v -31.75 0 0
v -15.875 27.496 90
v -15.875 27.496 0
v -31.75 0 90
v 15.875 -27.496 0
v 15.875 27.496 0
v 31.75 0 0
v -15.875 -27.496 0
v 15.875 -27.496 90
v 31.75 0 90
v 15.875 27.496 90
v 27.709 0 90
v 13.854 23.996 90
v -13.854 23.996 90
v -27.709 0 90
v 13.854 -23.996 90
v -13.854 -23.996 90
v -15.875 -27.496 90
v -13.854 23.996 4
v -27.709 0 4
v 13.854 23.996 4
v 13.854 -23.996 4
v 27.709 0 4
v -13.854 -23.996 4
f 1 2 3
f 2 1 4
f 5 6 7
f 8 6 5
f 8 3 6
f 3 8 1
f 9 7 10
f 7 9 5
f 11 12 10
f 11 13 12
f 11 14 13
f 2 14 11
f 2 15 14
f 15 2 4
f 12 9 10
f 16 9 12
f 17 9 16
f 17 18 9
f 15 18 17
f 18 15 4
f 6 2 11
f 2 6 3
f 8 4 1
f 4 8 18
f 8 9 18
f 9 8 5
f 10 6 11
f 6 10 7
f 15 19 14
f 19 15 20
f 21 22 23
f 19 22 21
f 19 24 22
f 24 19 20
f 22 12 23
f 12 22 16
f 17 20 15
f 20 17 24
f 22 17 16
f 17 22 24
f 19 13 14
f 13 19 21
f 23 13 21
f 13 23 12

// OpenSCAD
// Hex Desk Organizer — Appy's Studio parametric generator
//
// A modular desk set: hexagonal cells that tessellate against each other, so a
// pen pot, a phone stand and a coaster sit together without gaps. The studio's
// own design — the existing modules are fixed at 31.75mm circumradius and
// 3.5mm walls, which is what `cell` and `wall` default to here, so a printed
// part still packs against the ones already on the desk.
//
// Magnet pockets go in the flats, not the base, so neighbouring cells hold on
// to each other rather than to the desk.

type = "pen";          // pen | marker | notes | cable | phone | coaster
cell = 31.75;          // circumradius — the studio standard
height = 90;
wall = 3.5;
base = 4.0;
magnets = false;
magnet_d = 6.2;        // 6mm magnet plus a printed-fit allowance
magnet_h = 3.2;

$fn = 64;

// A hexagon is specified by its circumradius; the flats sit at cr*cos(30).
apothem = cell * cos(30);
inner_apothem = apothem - wall;
inner_cell = inner_apothem / cos(30);

module hex(cr, h) {
    linear_extrude(height = h) circle(r = cr, $fn = 6);
}

// Straight-walled cup — the base for most of the modules.
module cup(h, floor_thickness) {
    difference() {
        hex(cell, h);
        translate([0, 0, floor_thickness])
            hex(inner_cell, h);
    }
}

// Pockets in each of the six flats, at mid-height, so cells snap side to side.
module magnet_pockets(h) {
    z = min(h / 2, max(magnet_d, 12));
    for (i = [0 : 5])
        rotate([0, 0, i * 60])
            translate([apothem - magnet_h, 0, z])
                rotate([0, 90, 0])
                    cylinder(d = magnet_d, h = magnet_h + 0.01, $fn = 32);
}

// Everything above the plane that meets the front flat at `front_z` and the
// back flat at `back_z`. Cutting downward-only matters: a cut that also leaned
// forward would slice the footprint back from a full hexagon, and then the cell
// no longer sits flush against its neighbours, which is the whole point of the
// system.
module slanted_top(front_z, back_z) {
    angle = atan2(back_z - front_z, 2 * apothem);
    big = cell * 6;
    translate([0, 0, (front_z + back_z) / 2])
        rotate([0, -angle, 0])
            translate([0, 0, big / 2])
                cube([big, big, big], center = true);
}

module body() {
    if (type == "pen") {
        cup(height, base);

    } else if (type == "marker") {
        // Markers are stubby, so this one is shorter and cut away at the front:
        // a low lip to hold them in, a high back so it still reads as a cell.
        h = max(30, height * 0.62);
        difference() {
            cup(h, base);
            slanted_top(h * 0.45, h);
        }

    } else if (type == "notes") {
        // A shallow well for a note block, open at the front so the top sheet
        // can be pulled off without lifting the pad out.
        h = max(20, height * 0.35);
        difference() {
            cup(h, base);
            slanted_top(base + 4, h);
        }

    } else if (type == "cable") {
        // Solid-ish block with slots across the top to drop cable ends into.
        h = max(18, height * 0.28);
        slot = 5;
        difference() {
            hex(cell, h);
            for (i = [-1, 0, 1])
                translate([i * (slot * 2.2), 0, h - slot * 0.8])
                    rotate([0, 0, 90])
                        union() {
                            // A keyhole: narrow at the top so the cable clips
                            // in and the plug end cannot pull back through.
                            translate([0, 0, slot * 0.8])
                                cube([cell * 3, slot * 0.62, slot * 1.6], center = true);
                            rotate([0, 90, 0])
                                cylinder(d = slot, h = cell * 3, center = true, $fn = 32);
                        }
        }

    } else if (type == "phone") {
        // A solid block with a leaning slot down the middle. 15 degrees off
        // vertical is where a phone stops trying to tip forward out of it.
        lean = 15;
        slot_w = 13;            // phone plus a case
        h = max(40, height * 0.62);
        slot_depth = h * 0.6;
        difference() {
            hex(cell, h);
            // The slot's floor sits at the rotation origin and it runs well
            // past the top, so the cut is open rather than a buried pocket.
            translate([0, 0, h - slot_depth])
                rotate([0, lean, 0])
                    translate([0, 0, slot_depth])
                        cube([slot_w, cell * 3, slot_depth * 2], center = true);
            // A charging cable reaches the port from underneath.
            translate([0, 0, -0.01])
                cylinder(d = 11, h = h - slot_depth + 2, $fn = 32);
        }

    } else {
        // coaster — a shallow dish with a raised rim
        h = max(6, base + 4);
        difference() {
            hex(cell, h);
            translate([0, 0, base])
                hex(inner_cell, h);
        }
    }
}

// Each type decides its own height from `height`; the magnet pockets have to
// sit inside whatever that turned out to be.
function finished_height() =
    type == "marker"  ? max(30, height * 0.62) :
    type == "notes"   ? max(20, height * 0.35) :
    type == "cable"   ? max(18, height * 0.28) :
    type == "phone"   ? max(40, height * 0.62) :
    type == "coaster" ? max(6, base + 4) :
                        height;

difference() {
    body();
    if (magnets) magnet_pockets(finished_height());
}
